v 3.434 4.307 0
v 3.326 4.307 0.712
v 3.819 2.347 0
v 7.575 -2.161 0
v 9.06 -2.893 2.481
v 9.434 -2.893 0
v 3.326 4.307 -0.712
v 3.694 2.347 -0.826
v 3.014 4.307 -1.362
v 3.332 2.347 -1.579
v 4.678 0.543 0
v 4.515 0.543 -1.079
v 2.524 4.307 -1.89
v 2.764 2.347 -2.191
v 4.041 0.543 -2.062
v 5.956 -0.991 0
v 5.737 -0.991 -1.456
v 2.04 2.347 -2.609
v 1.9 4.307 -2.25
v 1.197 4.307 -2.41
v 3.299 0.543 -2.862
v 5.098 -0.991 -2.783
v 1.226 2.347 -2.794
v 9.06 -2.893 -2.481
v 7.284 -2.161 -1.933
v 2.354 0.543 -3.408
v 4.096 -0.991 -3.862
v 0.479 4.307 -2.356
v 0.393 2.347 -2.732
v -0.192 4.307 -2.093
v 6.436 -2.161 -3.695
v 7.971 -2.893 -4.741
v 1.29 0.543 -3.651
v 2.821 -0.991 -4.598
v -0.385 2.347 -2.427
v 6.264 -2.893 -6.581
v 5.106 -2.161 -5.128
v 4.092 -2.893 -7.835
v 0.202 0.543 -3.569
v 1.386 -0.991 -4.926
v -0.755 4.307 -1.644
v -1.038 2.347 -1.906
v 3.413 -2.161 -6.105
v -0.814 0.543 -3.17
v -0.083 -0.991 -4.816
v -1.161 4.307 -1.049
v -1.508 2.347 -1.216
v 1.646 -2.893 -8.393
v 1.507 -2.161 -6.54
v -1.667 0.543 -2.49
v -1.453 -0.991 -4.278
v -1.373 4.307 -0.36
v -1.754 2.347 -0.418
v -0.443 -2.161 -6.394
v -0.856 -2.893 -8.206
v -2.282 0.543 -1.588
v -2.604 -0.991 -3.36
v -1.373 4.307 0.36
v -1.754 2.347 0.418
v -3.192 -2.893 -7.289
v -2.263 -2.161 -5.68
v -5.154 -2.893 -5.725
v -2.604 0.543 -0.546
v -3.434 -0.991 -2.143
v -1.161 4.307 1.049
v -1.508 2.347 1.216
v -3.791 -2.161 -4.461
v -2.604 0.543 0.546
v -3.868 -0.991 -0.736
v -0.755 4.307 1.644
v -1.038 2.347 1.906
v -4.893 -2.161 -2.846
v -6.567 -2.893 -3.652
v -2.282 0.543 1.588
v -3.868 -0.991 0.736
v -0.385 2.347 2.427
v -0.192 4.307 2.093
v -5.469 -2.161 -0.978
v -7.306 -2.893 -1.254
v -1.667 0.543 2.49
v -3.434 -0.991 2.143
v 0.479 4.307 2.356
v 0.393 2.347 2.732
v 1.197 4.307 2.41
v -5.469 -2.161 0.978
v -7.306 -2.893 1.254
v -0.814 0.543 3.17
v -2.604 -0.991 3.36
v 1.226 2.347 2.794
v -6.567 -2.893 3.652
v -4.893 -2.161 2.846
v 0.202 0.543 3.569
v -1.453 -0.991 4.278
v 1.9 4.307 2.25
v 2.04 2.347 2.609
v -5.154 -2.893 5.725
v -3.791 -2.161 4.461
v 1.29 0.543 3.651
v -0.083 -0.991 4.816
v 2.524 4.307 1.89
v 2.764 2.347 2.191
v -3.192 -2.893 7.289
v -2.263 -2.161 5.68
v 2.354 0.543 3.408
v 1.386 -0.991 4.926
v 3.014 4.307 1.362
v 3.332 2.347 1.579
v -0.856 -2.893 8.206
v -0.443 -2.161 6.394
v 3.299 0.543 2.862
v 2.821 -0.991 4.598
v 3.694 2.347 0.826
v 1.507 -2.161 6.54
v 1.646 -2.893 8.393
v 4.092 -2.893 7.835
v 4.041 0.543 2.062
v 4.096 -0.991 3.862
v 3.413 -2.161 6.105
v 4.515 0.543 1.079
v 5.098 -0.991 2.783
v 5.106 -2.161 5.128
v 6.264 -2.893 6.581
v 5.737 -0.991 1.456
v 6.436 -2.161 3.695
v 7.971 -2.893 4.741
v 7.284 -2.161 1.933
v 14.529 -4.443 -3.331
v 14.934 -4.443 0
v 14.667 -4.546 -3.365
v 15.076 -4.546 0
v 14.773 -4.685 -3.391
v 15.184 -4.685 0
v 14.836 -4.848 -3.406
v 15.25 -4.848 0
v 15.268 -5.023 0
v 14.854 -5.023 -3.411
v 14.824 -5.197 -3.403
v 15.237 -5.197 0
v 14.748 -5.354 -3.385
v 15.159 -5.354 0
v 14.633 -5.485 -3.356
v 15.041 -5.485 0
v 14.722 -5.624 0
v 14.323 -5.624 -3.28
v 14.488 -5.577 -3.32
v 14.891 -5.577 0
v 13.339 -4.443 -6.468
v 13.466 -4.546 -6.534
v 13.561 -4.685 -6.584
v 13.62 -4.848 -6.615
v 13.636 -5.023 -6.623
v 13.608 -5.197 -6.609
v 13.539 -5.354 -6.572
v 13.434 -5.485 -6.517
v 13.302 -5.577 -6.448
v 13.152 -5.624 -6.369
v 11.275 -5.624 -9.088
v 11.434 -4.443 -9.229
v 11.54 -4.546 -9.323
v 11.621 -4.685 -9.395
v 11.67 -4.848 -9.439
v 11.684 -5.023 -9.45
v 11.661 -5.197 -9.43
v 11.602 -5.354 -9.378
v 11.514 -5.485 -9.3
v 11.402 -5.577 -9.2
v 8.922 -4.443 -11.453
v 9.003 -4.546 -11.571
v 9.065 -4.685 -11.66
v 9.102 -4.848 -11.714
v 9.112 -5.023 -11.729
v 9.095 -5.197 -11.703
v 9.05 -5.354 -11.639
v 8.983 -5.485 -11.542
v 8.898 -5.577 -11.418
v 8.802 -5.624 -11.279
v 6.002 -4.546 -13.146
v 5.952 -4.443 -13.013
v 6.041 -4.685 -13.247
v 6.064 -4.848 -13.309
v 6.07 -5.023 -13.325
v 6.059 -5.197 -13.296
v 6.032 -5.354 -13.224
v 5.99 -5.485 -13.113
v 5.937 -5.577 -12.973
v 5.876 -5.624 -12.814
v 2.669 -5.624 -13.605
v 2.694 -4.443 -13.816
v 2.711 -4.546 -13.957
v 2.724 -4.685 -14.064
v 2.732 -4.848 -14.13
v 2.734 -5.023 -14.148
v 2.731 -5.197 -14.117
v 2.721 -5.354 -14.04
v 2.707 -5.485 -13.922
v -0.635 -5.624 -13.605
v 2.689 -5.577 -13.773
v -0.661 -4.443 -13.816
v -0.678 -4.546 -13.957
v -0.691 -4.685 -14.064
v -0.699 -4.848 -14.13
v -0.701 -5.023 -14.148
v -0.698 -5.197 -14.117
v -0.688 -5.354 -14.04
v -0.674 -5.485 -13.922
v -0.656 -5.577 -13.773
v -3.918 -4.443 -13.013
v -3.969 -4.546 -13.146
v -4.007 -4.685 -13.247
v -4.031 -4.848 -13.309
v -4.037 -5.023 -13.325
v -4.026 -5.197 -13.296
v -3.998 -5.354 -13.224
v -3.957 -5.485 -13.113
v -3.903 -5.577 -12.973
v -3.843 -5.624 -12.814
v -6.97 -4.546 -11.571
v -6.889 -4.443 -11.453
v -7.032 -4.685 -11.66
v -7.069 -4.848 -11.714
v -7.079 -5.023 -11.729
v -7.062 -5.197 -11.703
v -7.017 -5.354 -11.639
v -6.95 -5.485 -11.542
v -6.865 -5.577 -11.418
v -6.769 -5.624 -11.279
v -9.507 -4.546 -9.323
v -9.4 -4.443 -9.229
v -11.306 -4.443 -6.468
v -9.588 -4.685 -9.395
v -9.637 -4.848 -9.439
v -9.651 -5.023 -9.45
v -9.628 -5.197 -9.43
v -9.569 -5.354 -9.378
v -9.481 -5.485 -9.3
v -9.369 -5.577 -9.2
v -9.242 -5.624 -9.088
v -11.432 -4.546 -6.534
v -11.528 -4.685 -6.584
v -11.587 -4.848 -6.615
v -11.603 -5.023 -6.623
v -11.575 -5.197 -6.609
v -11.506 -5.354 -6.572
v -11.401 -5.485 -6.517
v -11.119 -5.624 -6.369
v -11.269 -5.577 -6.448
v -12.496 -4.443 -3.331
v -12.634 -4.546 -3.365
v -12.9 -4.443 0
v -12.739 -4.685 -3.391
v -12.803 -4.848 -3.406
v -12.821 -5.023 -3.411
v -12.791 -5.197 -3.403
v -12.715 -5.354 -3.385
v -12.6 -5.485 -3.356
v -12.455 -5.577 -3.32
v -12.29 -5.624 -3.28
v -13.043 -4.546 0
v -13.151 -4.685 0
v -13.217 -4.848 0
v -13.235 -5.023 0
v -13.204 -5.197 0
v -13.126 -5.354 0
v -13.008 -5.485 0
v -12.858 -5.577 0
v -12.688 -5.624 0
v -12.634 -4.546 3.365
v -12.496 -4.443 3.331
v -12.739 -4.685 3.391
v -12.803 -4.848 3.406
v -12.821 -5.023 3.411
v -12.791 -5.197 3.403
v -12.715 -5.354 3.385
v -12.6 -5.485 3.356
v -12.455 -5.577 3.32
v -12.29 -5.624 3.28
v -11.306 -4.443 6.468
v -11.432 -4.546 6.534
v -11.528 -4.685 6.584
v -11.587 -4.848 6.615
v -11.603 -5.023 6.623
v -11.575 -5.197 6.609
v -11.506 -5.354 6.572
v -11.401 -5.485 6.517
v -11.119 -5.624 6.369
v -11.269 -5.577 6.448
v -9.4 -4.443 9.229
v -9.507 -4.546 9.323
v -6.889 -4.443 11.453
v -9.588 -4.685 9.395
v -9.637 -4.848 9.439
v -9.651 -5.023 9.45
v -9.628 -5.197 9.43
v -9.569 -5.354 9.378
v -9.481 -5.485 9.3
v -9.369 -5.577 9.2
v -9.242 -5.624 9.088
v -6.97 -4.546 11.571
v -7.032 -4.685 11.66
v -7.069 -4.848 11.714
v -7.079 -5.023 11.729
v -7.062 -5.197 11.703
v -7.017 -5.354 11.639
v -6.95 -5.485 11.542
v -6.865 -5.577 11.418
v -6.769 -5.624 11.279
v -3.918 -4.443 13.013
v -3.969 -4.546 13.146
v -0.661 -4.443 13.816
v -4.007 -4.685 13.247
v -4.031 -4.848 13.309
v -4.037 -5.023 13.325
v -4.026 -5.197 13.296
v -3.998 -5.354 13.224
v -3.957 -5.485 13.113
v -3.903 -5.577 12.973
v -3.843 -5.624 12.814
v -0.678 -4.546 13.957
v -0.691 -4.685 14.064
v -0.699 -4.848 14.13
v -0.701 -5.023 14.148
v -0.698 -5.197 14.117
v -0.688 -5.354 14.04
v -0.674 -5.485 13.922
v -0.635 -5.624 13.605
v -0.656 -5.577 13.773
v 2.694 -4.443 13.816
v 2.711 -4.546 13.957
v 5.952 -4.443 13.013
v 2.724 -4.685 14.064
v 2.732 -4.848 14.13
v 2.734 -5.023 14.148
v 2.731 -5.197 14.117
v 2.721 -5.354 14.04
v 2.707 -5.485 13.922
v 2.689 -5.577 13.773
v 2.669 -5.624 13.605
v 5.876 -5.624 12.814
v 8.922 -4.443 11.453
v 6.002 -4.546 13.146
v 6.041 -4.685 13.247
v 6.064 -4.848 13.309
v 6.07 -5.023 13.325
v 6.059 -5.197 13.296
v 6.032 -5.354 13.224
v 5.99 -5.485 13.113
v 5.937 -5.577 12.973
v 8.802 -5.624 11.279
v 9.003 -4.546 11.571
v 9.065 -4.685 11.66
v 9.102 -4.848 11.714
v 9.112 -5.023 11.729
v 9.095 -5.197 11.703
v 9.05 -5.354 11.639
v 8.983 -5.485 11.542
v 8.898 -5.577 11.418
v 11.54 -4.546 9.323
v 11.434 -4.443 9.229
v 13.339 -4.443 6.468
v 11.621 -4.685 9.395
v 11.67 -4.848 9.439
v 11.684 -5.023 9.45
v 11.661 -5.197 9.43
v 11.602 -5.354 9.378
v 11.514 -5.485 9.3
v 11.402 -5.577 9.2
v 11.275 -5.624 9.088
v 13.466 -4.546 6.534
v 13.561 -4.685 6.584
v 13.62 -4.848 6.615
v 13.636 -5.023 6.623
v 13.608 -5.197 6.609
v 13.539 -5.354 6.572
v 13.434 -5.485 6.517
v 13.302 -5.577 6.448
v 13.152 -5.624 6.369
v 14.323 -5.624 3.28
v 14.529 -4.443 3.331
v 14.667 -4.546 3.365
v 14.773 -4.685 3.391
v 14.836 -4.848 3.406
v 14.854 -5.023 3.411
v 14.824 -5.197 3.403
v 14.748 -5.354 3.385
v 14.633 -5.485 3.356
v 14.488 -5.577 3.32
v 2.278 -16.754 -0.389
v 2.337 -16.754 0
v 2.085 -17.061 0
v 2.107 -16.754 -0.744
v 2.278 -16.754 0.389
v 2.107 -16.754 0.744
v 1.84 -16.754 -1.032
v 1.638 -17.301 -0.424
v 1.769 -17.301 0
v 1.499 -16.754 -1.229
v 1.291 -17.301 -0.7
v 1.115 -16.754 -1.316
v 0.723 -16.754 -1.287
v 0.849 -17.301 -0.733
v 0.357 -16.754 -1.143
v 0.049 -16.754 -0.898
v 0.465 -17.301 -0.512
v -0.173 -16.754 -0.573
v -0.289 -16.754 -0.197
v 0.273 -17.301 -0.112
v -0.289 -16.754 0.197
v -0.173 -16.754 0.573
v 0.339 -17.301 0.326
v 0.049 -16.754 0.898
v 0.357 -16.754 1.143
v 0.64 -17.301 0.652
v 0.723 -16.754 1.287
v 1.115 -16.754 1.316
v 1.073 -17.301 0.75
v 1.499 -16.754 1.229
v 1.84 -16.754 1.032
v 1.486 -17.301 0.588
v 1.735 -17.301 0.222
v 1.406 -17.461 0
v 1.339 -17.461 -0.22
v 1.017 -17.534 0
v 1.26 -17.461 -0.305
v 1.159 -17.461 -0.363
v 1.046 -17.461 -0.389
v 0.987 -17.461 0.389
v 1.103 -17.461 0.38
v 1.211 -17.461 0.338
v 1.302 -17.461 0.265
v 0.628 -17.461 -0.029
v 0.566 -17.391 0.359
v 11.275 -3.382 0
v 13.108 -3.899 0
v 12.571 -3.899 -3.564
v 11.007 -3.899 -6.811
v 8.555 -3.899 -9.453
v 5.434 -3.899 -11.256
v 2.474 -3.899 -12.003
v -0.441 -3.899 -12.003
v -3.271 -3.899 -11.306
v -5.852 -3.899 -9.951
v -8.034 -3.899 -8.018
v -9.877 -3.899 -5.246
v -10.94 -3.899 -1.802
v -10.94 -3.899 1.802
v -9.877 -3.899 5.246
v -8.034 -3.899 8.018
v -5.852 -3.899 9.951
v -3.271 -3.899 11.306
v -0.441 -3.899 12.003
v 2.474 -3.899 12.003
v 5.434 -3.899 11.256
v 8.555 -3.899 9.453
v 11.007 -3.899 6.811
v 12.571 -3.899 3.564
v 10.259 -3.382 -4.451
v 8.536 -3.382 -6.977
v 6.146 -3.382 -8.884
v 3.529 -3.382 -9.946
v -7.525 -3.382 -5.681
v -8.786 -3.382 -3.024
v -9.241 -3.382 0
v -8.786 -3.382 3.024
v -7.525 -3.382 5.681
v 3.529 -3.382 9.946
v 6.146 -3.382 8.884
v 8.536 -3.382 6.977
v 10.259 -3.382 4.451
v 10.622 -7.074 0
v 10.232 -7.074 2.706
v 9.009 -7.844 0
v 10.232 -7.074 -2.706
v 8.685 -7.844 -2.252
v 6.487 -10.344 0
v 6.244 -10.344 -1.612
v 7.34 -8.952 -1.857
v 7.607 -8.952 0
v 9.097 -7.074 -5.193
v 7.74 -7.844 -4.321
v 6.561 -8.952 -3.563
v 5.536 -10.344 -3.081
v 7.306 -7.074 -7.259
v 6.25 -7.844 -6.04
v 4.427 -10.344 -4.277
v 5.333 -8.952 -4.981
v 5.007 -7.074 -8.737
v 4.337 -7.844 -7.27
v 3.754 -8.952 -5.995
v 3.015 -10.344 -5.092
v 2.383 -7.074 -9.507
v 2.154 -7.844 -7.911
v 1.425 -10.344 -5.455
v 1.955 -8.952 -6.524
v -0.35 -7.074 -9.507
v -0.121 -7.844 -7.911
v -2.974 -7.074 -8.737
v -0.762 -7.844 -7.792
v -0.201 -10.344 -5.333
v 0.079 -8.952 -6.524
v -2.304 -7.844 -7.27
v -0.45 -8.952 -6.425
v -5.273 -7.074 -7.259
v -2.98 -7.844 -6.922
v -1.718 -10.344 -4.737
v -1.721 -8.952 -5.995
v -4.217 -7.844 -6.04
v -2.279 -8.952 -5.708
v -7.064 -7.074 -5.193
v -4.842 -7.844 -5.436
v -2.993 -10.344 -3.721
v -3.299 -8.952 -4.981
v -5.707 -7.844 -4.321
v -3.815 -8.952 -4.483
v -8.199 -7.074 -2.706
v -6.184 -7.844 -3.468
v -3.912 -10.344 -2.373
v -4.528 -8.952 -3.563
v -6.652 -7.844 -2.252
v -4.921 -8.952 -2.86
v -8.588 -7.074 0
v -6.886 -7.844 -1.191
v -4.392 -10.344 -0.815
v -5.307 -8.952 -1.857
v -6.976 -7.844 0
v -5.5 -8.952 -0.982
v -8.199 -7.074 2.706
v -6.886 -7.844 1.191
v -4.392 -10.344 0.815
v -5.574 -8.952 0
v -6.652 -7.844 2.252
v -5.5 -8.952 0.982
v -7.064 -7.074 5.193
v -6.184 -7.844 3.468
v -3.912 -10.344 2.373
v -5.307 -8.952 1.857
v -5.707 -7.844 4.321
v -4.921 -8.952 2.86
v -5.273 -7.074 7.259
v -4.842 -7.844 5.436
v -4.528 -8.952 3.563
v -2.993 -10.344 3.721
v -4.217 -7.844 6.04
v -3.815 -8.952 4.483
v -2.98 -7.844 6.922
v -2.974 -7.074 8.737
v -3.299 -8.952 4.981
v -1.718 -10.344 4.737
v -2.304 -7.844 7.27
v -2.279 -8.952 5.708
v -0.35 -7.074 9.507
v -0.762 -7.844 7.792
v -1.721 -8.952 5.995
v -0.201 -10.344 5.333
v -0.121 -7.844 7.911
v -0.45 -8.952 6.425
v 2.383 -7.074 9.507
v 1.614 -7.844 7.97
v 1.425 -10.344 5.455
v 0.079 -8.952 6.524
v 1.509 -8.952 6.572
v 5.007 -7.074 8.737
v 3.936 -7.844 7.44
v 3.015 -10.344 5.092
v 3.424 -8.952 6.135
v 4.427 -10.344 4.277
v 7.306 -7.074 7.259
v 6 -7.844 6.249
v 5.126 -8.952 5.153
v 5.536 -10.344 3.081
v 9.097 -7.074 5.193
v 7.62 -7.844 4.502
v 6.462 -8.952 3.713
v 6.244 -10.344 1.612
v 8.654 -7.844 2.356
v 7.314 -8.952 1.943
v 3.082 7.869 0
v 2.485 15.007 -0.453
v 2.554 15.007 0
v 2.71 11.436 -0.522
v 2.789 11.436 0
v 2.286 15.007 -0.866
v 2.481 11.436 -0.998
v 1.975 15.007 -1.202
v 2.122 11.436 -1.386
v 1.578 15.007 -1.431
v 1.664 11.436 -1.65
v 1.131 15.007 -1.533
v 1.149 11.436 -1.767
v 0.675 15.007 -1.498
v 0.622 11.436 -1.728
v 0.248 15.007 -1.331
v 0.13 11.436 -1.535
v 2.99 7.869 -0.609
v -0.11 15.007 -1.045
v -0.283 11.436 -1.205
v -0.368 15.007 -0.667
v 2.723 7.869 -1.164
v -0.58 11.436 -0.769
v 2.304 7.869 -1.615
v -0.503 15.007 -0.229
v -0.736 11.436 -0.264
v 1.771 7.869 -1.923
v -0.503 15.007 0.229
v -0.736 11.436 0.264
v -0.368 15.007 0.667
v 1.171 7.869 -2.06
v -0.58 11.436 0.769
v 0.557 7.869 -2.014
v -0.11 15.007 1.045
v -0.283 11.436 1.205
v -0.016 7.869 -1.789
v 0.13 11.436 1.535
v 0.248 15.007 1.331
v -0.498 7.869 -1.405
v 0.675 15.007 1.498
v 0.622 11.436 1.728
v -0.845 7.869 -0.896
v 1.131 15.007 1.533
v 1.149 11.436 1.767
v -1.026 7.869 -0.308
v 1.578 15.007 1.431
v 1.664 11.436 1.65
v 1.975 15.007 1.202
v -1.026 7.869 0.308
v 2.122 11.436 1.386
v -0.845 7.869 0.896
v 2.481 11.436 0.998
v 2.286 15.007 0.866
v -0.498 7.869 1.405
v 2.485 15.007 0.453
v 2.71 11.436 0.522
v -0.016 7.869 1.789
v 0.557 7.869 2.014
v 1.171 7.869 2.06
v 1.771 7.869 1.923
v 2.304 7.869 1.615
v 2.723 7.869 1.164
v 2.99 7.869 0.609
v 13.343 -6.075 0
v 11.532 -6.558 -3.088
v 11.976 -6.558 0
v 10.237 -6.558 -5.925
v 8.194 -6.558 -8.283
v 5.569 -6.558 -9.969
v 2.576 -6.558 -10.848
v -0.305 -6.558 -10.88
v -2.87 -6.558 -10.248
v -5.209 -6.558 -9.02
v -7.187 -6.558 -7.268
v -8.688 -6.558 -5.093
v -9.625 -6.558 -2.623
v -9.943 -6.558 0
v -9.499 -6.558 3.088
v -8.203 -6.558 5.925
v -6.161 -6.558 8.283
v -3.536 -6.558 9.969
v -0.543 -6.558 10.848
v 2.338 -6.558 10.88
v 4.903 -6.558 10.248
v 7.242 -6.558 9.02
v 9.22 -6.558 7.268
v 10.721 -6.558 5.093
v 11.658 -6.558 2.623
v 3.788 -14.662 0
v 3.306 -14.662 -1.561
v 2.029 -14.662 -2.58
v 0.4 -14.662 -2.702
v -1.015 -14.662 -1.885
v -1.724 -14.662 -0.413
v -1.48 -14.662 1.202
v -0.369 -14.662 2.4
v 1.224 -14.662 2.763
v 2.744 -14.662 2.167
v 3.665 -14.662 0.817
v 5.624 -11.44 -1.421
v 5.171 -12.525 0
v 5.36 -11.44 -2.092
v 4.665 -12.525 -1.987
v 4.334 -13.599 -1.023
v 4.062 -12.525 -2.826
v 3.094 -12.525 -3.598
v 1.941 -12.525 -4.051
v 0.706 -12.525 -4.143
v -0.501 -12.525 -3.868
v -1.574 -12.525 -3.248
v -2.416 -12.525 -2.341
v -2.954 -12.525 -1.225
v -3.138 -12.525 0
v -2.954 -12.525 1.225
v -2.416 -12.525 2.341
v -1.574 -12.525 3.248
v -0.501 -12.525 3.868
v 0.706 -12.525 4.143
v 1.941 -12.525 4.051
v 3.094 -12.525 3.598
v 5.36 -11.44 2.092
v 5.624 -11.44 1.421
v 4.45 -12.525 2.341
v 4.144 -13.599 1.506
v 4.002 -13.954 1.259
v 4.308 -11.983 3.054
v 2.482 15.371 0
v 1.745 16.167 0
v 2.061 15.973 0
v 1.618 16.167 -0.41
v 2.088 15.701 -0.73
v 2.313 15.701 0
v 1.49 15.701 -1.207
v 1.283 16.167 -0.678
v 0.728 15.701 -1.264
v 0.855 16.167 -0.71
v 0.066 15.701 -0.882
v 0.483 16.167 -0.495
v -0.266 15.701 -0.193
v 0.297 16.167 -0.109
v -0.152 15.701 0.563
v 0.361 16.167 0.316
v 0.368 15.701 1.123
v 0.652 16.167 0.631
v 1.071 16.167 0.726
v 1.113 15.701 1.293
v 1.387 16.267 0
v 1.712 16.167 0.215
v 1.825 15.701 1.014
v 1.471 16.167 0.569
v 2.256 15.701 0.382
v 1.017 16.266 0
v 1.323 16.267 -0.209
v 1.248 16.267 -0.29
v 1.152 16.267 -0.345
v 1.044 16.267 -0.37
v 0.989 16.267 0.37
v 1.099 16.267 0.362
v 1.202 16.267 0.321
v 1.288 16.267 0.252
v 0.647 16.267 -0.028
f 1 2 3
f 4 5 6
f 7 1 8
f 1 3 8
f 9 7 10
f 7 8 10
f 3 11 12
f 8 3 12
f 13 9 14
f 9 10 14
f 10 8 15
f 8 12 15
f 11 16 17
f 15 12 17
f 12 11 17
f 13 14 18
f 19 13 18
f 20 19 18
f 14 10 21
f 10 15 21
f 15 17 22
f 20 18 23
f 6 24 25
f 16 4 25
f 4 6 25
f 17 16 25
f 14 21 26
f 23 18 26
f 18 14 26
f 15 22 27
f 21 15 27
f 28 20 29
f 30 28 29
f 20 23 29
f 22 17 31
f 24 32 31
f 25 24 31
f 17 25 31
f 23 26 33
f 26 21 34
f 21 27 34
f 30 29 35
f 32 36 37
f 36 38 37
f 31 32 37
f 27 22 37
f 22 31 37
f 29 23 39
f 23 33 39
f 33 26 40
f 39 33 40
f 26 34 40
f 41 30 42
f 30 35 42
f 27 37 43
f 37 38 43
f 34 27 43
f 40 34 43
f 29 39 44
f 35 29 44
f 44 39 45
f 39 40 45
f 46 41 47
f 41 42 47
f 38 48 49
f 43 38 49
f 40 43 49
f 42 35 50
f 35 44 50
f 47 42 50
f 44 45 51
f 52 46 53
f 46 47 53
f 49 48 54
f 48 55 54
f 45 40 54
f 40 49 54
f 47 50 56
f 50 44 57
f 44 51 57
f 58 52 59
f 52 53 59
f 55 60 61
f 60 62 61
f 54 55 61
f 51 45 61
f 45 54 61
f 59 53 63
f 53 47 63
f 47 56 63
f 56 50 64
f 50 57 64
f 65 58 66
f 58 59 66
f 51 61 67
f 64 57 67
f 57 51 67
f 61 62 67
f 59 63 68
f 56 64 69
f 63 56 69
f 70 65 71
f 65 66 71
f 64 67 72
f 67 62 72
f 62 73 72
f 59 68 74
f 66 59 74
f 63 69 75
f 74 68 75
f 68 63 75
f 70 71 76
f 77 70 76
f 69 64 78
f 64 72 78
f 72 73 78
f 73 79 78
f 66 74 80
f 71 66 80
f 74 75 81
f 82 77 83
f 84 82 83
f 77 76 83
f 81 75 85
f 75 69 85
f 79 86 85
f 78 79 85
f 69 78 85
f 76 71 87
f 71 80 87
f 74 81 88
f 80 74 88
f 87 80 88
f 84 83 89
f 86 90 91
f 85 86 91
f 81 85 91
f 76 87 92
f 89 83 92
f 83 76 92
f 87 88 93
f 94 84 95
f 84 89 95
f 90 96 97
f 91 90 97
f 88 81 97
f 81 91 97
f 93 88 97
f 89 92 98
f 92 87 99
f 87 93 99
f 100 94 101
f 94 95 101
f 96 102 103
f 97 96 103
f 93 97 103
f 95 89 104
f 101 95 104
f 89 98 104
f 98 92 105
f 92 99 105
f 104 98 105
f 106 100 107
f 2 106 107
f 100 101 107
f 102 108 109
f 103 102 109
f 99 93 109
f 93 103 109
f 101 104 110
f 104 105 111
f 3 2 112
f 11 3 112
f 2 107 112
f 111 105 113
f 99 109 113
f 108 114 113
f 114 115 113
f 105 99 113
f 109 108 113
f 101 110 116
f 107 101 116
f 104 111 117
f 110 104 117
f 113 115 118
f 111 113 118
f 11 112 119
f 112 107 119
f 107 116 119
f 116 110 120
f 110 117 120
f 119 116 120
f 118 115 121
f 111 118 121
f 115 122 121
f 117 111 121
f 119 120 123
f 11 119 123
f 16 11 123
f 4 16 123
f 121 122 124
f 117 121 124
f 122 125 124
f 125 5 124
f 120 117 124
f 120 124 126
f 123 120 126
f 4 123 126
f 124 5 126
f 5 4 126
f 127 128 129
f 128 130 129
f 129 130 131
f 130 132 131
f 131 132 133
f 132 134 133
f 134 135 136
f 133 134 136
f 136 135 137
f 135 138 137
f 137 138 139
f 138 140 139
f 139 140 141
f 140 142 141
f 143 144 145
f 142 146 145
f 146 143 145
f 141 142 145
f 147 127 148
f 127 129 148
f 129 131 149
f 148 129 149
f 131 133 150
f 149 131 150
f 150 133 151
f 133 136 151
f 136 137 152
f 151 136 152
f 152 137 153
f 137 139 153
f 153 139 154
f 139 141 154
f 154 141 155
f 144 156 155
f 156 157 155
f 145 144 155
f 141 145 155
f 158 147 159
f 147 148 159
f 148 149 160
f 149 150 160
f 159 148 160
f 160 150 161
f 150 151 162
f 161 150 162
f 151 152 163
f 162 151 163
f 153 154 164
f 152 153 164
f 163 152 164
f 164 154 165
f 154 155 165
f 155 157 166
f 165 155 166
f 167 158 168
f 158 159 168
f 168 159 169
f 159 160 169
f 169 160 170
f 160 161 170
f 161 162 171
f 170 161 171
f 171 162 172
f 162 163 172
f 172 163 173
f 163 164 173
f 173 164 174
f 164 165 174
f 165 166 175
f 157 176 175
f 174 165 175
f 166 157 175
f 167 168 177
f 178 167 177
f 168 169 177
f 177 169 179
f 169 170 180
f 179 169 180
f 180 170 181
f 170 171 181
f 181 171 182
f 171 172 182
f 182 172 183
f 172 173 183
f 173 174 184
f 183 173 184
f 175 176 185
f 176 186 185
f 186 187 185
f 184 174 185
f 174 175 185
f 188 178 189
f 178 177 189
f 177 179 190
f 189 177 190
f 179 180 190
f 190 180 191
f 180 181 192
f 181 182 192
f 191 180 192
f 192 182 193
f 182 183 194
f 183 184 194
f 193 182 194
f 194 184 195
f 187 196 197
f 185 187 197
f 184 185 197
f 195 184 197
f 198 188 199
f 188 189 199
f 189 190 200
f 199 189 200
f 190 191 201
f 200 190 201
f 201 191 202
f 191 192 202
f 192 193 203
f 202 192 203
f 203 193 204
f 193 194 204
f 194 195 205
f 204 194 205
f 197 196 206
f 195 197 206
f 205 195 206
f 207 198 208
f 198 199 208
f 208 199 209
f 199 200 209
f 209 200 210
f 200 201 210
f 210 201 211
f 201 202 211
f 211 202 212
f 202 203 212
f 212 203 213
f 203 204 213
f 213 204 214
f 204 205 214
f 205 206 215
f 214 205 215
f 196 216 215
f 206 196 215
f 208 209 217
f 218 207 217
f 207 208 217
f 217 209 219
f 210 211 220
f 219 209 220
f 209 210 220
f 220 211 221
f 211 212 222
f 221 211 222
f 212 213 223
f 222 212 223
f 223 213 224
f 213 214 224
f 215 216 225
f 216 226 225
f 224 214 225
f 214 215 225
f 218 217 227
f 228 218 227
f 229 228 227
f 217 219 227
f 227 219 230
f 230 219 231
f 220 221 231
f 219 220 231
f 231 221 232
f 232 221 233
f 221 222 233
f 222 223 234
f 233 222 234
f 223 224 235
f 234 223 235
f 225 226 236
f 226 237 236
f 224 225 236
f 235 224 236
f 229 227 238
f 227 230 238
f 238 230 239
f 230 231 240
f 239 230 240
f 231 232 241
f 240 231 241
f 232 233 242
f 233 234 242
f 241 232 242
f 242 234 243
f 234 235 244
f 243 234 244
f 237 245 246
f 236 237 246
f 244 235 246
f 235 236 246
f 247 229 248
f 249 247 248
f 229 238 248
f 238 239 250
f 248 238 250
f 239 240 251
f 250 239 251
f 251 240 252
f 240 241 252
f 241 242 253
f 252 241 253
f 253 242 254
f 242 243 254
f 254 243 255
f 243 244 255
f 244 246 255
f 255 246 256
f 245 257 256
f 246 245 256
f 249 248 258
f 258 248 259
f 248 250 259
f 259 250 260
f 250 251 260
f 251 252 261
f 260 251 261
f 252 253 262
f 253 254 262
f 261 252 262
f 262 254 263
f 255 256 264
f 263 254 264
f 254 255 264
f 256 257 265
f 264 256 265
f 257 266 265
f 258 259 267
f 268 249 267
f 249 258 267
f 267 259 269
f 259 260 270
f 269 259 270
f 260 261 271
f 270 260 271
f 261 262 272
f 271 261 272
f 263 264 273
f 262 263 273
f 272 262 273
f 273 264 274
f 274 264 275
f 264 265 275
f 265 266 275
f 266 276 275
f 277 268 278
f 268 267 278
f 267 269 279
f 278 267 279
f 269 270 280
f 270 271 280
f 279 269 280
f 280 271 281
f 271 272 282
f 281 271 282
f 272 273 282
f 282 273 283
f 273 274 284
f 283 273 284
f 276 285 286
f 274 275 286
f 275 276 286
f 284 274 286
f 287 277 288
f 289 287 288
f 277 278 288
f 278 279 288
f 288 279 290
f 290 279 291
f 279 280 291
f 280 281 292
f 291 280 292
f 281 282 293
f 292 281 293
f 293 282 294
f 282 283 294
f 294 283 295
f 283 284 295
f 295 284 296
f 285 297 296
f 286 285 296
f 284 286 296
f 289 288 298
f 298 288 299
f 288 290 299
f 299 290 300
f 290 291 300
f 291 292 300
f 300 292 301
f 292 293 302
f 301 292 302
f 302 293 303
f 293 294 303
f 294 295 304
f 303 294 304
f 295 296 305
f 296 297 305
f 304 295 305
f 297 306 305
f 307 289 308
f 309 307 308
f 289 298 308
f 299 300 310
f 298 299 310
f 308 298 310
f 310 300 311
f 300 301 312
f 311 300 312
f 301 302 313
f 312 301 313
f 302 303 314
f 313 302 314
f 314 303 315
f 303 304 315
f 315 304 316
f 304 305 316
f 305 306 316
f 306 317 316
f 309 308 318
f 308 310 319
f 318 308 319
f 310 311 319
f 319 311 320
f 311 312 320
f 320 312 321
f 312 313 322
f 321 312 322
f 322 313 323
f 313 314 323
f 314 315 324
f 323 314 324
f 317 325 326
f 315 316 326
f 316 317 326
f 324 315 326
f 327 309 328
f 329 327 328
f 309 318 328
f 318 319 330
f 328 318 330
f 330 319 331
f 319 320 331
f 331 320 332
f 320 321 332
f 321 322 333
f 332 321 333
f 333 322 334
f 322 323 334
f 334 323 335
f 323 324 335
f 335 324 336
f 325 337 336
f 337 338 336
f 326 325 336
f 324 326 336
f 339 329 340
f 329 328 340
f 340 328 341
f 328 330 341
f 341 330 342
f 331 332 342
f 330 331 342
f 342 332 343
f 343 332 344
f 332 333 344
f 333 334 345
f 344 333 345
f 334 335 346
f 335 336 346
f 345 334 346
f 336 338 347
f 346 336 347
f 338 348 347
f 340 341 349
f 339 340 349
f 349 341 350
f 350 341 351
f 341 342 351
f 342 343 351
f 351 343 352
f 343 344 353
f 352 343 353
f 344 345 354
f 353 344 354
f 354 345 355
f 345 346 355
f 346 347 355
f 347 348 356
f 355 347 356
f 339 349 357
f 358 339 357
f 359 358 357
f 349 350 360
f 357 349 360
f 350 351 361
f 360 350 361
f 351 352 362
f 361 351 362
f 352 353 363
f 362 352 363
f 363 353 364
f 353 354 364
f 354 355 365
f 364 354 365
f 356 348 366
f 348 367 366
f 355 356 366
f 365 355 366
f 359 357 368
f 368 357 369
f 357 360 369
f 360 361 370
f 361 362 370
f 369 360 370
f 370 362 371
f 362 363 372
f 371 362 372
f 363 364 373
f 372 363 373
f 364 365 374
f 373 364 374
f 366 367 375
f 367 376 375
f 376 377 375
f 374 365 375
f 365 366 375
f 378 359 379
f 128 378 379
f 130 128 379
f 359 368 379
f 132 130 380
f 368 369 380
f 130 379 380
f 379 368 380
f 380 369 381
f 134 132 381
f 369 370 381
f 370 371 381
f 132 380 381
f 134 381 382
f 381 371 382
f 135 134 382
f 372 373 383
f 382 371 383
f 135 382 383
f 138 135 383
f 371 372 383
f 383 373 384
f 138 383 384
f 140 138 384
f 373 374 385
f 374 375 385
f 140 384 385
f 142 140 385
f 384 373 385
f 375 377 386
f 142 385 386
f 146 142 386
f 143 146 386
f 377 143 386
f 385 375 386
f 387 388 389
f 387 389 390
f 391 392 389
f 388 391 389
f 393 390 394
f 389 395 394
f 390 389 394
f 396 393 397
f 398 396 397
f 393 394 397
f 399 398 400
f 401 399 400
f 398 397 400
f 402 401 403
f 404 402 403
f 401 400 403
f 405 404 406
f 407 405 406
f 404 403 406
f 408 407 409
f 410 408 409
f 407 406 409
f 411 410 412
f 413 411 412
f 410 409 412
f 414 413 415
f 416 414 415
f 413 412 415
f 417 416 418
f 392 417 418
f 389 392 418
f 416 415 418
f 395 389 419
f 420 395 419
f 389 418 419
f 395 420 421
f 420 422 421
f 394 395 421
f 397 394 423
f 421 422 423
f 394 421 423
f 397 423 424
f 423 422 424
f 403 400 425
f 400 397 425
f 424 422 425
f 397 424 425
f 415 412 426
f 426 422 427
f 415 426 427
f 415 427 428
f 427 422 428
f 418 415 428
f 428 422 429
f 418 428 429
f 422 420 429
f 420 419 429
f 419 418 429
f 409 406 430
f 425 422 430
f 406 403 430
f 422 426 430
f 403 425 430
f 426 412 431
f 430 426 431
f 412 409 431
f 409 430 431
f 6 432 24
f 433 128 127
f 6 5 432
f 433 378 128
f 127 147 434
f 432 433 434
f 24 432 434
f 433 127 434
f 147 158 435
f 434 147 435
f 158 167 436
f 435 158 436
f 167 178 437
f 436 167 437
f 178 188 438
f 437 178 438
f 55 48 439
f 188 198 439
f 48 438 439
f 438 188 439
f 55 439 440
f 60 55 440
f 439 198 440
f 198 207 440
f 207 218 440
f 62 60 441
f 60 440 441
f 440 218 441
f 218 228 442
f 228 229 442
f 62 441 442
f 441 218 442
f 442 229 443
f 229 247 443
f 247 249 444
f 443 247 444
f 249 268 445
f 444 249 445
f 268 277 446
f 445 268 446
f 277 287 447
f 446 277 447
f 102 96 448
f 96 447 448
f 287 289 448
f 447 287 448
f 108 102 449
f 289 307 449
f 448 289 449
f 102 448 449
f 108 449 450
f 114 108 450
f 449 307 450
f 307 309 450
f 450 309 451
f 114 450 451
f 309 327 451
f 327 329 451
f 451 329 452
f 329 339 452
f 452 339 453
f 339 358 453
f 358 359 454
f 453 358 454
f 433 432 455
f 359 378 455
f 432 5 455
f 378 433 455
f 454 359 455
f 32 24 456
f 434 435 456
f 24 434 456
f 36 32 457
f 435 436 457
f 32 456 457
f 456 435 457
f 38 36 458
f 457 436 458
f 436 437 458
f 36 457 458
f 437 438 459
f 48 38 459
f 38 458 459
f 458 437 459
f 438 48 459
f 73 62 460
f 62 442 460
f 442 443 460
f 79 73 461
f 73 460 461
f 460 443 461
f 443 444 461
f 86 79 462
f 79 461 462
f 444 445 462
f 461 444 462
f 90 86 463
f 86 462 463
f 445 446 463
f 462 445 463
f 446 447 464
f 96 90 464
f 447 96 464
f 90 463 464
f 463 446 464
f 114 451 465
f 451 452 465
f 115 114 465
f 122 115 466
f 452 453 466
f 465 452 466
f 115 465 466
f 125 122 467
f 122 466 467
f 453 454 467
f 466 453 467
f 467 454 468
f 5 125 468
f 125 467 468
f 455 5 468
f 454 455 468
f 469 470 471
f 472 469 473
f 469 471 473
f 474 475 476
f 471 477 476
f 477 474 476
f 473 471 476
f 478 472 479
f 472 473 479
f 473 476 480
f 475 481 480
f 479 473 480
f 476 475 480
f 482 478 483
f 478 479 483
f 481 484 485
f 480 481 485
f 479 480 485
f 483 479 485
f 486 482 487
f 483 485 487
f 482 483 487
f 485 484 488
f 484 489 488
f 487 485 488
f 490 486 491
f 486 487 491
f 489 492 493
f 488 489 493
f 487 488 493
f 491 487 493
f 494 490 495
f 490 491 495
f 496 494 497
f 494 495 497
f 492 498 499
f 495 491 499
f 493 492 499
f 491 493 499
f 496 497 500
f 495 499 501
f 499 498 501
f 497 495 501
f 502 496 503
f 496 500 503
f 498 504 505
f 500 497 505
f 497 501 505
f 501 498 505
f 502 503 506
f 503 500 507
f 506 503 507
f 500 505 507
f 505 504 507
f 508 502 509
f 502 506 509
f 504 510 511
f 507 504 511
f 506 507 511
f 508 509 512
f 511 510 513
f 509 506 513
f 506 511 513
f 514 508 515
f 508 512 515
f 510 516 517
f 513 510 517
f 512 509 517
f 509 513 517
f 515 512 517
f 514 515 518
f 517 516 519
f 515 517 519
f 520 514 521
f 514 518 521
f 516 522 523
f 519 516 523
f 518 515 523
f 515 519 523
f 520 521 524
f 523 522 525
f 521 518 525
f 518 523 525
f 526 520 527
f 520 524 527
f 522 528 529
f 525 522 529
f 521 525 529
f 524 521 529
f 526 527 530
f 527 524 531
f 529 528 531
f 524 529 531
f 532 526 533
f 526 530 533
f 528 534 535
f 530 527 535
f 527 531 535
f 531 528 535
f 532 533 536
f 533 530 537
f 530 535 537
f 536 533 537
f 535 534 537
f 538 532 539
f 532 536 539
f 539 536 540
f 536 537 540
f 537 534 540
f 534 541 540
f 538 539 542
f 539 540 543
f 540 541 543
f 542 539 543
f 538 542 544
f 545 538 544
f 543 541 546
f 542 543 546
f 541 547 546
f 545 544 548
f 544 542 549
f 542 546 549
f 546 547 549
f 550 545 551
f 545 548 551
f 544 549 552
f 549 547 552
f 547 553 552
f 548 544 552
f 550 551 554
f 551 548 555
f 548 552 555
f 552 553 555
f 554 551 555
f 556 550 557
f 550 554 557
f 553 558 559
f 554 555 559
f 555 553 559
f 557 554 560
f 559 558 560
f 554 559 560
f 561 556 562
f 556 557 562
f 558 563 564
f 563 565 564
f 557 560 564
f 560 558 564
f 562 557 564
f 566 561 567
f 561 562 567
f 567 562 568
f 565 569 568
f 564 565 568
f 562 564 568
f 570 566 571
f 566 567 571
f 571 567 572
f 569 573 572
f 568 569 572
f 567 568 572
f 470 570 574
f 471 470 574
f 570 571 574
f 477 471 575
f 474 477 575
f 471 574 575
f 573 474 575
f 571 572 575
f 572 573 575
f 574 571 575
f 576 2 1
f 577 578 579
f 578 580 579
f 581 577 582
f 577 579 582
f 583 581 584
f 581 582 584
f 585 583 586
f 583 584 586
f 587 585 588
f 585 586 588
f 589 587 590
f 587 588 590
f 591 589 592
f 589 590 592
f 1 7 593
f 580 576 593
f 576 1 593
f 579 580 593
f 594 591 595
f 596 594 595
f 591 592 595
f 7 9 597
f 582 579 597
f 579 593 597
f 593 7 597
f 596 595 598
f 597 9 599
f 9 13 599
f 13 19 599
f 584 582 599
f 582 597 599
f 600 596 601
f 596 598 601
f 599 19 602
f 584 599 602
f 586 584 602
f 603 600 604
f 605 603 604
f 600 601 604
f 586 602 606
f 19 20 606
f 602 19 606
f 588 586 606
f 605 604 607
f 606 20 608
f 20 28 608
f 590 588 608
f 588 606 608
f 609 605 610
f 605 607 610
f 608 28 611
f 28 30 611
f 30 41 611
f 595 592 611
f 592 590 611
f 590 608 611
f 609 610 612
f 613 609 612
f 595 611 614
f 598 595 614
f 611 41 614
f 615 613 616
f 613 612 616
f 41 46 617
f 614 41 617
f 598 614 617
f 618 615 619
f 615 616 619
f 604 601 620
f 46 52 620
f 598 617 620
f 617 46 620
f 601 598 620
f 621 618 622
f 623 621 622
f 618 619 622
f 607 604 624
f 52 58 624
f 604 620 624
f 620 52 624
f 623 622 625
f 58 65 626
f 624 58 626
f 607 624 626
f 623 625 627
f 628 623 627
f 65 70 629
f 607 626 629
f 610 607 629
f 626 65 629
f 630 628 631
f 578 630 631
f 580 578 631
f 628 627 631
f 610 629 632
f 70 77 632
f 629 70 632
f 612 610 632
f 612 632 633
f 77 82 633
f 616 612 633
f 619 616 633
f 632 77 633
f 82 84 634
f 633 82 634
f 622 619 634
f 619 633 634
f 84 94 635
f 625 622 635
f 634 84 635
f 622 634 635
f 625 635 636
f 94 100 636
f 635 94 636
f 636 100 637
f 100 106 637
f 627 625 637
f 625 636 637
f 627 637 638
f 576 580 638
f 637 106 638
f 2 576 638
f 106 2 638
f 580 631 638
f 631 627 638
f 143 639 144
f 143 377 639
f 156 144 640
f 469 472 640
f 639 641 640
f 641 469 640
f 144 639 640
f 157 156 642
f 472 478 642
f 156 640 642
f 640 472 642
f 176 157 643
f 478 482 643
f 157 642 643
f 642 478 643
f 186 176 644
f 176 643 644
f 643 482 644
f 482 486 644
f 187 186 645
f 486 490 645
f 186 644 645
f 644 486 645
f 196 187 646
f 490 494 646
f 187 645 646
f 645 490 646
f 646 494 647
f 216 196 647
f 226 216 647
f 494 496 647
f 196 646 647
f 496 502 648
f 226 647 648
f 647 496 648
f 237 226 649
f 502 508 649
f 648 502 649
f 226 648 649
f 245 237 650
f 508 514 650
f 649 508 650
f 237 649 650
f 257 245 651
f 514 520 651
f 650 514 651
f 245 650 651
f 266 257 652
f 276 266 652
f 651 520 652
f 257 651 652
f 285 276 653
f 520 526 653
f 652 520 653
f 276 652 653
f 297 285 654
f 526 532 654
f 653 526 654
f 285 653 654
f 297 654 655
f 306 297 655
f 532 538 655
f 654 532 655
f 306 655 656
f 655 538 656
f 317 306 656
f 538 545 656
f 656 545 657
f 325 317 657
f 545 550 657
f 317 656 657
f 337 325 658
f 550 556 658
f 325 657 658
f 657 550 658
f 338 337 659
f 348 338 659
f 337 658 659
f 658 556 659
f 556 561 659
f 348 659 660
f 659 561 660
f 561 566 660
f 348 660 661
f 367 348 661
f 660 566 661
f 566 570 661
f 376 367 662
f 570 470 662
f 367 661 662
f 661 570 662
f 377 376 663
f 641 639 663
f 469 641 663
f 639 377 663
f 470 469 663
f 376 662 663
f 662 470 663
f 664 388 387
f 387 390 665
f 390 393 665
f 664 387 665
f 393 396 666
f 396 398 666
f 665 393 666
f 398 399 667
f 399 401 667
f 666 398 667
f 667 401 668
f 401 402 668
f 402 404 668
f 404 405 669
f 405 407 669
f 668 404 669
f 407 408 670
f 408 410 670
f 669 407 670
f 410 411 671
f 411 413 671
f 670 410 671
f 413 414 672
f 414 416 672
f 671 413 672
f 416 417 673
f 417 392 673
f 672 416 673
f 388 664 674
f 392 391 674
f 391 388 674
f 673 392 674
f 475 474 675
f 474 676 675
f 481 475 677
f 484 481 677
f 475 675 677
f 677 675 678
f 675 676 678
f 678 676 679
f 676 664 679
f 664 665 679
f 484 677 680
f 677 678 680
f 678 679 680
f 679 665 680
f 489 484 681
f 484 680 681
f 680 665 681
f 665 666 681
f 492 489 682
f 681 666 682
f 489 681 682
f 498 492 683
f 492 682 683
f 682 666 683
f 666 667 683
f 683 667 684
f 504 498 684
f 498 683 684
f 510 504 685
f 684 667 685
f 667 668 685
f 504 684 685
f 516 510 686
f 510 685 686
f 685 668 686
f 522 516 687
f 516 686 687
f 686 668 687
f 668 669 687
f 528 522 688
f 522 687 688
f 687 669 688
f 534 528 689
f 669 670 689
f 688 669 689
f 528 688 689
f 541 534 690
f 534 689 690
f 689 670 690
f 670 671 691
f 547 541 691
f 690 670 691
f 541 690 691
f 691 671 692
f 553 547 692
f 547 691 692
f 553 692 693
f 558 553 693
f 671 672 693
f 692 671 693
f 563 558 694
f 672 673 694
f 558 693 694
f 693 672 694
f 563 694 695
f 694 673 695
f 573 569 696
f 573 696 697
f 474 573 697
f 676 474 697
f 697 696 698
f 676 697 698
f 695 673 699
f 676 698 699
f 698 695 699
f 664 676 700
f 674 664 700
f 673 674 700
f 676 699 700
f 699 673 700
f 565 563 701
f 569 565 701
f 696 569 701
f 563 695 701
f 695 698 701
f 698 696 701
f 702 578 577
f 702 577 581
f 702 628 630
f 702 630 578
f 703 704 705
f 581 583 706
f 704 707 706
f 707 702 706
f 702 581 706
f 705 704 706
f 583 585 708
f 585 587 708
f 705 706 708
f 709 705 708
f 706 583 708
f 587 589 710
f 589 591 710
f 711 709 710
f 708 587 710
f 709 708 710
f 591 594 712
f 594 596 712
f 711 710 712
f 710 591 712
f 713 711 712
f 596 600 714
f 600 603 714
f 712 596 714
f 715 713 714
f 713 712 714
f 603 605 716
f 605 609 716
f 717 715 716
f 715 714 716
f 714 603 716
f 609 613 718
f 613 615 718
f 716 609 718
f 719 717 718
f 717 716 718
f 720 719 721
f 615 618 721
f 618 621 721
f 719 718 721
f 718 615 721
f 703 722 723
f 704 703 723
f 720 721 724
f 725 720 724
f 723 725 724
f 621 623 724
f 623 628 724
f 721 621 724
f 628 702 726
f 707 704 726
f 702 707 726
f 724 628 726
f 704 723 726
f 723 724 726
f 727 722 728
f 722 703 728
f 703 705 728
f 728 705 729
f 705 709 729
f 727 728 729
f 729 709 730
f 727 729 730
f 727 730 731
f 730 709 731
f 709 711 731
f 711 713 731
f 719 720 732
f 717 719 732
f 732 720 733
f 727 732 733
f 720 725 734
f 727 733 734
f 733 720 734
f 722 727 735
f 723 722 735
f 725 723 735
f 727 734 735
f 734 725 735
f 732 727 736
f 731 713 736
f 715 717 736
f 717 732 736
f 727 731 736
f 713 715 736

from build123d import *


with BuildPart() as part:
    # Esboço1 → Revolução1 (revolve)
    with BuildSketch(Plane.XY):
        with BuildLine():
            Line((1.016555702, -17.534294806), (1.016555702, 16.265705194))
            ThreePointArc((1.016555702, 16.265705194), (2.06121806, 15.973437857), (2.553565234, 15.006828371))
            ThreePointArc((2.553565234, 15.006828371), (2.92828475, 9.651459509), (3.433565234, 4.306828371))
            ThreePointArc((3.433565234, 4.306828371), (5.268808127, -0.263802551), (9.433565234, -2.893171629))
            ThreePointArc((9.433565234, -2.893171629), (12.192236118, -3.637403975), (14.933565234, -4.443171629))
            ThreePointArc((14.933565234, -4.443171629), (15.258578175, -5.111100137), (14.721555702, -5.624294806))
            ThreePointArc((14.721555702, -5.624294806), (12.658414234, -6.31213617), (10.621555702, -7.074294806))
            ThreePointArc((10.621555702, -7.074294806), (8.276967202, -8.358909194), (6.486555702, -10.344294806))
            ThreePointArc((6.486555702, -10.344294806), (4.488079996, -13.598838615), (2.336555702, -16.754294806))
            ThreePointArc((2.336555702, -16.754294806), (1.76887547, -17.300528258), (1.016555702, -17.534294806))
        make_face()
    revolve(axis=Axis((1.016555702, -17.534294806, 0), (0, 1, 0)))


solid = part.part
